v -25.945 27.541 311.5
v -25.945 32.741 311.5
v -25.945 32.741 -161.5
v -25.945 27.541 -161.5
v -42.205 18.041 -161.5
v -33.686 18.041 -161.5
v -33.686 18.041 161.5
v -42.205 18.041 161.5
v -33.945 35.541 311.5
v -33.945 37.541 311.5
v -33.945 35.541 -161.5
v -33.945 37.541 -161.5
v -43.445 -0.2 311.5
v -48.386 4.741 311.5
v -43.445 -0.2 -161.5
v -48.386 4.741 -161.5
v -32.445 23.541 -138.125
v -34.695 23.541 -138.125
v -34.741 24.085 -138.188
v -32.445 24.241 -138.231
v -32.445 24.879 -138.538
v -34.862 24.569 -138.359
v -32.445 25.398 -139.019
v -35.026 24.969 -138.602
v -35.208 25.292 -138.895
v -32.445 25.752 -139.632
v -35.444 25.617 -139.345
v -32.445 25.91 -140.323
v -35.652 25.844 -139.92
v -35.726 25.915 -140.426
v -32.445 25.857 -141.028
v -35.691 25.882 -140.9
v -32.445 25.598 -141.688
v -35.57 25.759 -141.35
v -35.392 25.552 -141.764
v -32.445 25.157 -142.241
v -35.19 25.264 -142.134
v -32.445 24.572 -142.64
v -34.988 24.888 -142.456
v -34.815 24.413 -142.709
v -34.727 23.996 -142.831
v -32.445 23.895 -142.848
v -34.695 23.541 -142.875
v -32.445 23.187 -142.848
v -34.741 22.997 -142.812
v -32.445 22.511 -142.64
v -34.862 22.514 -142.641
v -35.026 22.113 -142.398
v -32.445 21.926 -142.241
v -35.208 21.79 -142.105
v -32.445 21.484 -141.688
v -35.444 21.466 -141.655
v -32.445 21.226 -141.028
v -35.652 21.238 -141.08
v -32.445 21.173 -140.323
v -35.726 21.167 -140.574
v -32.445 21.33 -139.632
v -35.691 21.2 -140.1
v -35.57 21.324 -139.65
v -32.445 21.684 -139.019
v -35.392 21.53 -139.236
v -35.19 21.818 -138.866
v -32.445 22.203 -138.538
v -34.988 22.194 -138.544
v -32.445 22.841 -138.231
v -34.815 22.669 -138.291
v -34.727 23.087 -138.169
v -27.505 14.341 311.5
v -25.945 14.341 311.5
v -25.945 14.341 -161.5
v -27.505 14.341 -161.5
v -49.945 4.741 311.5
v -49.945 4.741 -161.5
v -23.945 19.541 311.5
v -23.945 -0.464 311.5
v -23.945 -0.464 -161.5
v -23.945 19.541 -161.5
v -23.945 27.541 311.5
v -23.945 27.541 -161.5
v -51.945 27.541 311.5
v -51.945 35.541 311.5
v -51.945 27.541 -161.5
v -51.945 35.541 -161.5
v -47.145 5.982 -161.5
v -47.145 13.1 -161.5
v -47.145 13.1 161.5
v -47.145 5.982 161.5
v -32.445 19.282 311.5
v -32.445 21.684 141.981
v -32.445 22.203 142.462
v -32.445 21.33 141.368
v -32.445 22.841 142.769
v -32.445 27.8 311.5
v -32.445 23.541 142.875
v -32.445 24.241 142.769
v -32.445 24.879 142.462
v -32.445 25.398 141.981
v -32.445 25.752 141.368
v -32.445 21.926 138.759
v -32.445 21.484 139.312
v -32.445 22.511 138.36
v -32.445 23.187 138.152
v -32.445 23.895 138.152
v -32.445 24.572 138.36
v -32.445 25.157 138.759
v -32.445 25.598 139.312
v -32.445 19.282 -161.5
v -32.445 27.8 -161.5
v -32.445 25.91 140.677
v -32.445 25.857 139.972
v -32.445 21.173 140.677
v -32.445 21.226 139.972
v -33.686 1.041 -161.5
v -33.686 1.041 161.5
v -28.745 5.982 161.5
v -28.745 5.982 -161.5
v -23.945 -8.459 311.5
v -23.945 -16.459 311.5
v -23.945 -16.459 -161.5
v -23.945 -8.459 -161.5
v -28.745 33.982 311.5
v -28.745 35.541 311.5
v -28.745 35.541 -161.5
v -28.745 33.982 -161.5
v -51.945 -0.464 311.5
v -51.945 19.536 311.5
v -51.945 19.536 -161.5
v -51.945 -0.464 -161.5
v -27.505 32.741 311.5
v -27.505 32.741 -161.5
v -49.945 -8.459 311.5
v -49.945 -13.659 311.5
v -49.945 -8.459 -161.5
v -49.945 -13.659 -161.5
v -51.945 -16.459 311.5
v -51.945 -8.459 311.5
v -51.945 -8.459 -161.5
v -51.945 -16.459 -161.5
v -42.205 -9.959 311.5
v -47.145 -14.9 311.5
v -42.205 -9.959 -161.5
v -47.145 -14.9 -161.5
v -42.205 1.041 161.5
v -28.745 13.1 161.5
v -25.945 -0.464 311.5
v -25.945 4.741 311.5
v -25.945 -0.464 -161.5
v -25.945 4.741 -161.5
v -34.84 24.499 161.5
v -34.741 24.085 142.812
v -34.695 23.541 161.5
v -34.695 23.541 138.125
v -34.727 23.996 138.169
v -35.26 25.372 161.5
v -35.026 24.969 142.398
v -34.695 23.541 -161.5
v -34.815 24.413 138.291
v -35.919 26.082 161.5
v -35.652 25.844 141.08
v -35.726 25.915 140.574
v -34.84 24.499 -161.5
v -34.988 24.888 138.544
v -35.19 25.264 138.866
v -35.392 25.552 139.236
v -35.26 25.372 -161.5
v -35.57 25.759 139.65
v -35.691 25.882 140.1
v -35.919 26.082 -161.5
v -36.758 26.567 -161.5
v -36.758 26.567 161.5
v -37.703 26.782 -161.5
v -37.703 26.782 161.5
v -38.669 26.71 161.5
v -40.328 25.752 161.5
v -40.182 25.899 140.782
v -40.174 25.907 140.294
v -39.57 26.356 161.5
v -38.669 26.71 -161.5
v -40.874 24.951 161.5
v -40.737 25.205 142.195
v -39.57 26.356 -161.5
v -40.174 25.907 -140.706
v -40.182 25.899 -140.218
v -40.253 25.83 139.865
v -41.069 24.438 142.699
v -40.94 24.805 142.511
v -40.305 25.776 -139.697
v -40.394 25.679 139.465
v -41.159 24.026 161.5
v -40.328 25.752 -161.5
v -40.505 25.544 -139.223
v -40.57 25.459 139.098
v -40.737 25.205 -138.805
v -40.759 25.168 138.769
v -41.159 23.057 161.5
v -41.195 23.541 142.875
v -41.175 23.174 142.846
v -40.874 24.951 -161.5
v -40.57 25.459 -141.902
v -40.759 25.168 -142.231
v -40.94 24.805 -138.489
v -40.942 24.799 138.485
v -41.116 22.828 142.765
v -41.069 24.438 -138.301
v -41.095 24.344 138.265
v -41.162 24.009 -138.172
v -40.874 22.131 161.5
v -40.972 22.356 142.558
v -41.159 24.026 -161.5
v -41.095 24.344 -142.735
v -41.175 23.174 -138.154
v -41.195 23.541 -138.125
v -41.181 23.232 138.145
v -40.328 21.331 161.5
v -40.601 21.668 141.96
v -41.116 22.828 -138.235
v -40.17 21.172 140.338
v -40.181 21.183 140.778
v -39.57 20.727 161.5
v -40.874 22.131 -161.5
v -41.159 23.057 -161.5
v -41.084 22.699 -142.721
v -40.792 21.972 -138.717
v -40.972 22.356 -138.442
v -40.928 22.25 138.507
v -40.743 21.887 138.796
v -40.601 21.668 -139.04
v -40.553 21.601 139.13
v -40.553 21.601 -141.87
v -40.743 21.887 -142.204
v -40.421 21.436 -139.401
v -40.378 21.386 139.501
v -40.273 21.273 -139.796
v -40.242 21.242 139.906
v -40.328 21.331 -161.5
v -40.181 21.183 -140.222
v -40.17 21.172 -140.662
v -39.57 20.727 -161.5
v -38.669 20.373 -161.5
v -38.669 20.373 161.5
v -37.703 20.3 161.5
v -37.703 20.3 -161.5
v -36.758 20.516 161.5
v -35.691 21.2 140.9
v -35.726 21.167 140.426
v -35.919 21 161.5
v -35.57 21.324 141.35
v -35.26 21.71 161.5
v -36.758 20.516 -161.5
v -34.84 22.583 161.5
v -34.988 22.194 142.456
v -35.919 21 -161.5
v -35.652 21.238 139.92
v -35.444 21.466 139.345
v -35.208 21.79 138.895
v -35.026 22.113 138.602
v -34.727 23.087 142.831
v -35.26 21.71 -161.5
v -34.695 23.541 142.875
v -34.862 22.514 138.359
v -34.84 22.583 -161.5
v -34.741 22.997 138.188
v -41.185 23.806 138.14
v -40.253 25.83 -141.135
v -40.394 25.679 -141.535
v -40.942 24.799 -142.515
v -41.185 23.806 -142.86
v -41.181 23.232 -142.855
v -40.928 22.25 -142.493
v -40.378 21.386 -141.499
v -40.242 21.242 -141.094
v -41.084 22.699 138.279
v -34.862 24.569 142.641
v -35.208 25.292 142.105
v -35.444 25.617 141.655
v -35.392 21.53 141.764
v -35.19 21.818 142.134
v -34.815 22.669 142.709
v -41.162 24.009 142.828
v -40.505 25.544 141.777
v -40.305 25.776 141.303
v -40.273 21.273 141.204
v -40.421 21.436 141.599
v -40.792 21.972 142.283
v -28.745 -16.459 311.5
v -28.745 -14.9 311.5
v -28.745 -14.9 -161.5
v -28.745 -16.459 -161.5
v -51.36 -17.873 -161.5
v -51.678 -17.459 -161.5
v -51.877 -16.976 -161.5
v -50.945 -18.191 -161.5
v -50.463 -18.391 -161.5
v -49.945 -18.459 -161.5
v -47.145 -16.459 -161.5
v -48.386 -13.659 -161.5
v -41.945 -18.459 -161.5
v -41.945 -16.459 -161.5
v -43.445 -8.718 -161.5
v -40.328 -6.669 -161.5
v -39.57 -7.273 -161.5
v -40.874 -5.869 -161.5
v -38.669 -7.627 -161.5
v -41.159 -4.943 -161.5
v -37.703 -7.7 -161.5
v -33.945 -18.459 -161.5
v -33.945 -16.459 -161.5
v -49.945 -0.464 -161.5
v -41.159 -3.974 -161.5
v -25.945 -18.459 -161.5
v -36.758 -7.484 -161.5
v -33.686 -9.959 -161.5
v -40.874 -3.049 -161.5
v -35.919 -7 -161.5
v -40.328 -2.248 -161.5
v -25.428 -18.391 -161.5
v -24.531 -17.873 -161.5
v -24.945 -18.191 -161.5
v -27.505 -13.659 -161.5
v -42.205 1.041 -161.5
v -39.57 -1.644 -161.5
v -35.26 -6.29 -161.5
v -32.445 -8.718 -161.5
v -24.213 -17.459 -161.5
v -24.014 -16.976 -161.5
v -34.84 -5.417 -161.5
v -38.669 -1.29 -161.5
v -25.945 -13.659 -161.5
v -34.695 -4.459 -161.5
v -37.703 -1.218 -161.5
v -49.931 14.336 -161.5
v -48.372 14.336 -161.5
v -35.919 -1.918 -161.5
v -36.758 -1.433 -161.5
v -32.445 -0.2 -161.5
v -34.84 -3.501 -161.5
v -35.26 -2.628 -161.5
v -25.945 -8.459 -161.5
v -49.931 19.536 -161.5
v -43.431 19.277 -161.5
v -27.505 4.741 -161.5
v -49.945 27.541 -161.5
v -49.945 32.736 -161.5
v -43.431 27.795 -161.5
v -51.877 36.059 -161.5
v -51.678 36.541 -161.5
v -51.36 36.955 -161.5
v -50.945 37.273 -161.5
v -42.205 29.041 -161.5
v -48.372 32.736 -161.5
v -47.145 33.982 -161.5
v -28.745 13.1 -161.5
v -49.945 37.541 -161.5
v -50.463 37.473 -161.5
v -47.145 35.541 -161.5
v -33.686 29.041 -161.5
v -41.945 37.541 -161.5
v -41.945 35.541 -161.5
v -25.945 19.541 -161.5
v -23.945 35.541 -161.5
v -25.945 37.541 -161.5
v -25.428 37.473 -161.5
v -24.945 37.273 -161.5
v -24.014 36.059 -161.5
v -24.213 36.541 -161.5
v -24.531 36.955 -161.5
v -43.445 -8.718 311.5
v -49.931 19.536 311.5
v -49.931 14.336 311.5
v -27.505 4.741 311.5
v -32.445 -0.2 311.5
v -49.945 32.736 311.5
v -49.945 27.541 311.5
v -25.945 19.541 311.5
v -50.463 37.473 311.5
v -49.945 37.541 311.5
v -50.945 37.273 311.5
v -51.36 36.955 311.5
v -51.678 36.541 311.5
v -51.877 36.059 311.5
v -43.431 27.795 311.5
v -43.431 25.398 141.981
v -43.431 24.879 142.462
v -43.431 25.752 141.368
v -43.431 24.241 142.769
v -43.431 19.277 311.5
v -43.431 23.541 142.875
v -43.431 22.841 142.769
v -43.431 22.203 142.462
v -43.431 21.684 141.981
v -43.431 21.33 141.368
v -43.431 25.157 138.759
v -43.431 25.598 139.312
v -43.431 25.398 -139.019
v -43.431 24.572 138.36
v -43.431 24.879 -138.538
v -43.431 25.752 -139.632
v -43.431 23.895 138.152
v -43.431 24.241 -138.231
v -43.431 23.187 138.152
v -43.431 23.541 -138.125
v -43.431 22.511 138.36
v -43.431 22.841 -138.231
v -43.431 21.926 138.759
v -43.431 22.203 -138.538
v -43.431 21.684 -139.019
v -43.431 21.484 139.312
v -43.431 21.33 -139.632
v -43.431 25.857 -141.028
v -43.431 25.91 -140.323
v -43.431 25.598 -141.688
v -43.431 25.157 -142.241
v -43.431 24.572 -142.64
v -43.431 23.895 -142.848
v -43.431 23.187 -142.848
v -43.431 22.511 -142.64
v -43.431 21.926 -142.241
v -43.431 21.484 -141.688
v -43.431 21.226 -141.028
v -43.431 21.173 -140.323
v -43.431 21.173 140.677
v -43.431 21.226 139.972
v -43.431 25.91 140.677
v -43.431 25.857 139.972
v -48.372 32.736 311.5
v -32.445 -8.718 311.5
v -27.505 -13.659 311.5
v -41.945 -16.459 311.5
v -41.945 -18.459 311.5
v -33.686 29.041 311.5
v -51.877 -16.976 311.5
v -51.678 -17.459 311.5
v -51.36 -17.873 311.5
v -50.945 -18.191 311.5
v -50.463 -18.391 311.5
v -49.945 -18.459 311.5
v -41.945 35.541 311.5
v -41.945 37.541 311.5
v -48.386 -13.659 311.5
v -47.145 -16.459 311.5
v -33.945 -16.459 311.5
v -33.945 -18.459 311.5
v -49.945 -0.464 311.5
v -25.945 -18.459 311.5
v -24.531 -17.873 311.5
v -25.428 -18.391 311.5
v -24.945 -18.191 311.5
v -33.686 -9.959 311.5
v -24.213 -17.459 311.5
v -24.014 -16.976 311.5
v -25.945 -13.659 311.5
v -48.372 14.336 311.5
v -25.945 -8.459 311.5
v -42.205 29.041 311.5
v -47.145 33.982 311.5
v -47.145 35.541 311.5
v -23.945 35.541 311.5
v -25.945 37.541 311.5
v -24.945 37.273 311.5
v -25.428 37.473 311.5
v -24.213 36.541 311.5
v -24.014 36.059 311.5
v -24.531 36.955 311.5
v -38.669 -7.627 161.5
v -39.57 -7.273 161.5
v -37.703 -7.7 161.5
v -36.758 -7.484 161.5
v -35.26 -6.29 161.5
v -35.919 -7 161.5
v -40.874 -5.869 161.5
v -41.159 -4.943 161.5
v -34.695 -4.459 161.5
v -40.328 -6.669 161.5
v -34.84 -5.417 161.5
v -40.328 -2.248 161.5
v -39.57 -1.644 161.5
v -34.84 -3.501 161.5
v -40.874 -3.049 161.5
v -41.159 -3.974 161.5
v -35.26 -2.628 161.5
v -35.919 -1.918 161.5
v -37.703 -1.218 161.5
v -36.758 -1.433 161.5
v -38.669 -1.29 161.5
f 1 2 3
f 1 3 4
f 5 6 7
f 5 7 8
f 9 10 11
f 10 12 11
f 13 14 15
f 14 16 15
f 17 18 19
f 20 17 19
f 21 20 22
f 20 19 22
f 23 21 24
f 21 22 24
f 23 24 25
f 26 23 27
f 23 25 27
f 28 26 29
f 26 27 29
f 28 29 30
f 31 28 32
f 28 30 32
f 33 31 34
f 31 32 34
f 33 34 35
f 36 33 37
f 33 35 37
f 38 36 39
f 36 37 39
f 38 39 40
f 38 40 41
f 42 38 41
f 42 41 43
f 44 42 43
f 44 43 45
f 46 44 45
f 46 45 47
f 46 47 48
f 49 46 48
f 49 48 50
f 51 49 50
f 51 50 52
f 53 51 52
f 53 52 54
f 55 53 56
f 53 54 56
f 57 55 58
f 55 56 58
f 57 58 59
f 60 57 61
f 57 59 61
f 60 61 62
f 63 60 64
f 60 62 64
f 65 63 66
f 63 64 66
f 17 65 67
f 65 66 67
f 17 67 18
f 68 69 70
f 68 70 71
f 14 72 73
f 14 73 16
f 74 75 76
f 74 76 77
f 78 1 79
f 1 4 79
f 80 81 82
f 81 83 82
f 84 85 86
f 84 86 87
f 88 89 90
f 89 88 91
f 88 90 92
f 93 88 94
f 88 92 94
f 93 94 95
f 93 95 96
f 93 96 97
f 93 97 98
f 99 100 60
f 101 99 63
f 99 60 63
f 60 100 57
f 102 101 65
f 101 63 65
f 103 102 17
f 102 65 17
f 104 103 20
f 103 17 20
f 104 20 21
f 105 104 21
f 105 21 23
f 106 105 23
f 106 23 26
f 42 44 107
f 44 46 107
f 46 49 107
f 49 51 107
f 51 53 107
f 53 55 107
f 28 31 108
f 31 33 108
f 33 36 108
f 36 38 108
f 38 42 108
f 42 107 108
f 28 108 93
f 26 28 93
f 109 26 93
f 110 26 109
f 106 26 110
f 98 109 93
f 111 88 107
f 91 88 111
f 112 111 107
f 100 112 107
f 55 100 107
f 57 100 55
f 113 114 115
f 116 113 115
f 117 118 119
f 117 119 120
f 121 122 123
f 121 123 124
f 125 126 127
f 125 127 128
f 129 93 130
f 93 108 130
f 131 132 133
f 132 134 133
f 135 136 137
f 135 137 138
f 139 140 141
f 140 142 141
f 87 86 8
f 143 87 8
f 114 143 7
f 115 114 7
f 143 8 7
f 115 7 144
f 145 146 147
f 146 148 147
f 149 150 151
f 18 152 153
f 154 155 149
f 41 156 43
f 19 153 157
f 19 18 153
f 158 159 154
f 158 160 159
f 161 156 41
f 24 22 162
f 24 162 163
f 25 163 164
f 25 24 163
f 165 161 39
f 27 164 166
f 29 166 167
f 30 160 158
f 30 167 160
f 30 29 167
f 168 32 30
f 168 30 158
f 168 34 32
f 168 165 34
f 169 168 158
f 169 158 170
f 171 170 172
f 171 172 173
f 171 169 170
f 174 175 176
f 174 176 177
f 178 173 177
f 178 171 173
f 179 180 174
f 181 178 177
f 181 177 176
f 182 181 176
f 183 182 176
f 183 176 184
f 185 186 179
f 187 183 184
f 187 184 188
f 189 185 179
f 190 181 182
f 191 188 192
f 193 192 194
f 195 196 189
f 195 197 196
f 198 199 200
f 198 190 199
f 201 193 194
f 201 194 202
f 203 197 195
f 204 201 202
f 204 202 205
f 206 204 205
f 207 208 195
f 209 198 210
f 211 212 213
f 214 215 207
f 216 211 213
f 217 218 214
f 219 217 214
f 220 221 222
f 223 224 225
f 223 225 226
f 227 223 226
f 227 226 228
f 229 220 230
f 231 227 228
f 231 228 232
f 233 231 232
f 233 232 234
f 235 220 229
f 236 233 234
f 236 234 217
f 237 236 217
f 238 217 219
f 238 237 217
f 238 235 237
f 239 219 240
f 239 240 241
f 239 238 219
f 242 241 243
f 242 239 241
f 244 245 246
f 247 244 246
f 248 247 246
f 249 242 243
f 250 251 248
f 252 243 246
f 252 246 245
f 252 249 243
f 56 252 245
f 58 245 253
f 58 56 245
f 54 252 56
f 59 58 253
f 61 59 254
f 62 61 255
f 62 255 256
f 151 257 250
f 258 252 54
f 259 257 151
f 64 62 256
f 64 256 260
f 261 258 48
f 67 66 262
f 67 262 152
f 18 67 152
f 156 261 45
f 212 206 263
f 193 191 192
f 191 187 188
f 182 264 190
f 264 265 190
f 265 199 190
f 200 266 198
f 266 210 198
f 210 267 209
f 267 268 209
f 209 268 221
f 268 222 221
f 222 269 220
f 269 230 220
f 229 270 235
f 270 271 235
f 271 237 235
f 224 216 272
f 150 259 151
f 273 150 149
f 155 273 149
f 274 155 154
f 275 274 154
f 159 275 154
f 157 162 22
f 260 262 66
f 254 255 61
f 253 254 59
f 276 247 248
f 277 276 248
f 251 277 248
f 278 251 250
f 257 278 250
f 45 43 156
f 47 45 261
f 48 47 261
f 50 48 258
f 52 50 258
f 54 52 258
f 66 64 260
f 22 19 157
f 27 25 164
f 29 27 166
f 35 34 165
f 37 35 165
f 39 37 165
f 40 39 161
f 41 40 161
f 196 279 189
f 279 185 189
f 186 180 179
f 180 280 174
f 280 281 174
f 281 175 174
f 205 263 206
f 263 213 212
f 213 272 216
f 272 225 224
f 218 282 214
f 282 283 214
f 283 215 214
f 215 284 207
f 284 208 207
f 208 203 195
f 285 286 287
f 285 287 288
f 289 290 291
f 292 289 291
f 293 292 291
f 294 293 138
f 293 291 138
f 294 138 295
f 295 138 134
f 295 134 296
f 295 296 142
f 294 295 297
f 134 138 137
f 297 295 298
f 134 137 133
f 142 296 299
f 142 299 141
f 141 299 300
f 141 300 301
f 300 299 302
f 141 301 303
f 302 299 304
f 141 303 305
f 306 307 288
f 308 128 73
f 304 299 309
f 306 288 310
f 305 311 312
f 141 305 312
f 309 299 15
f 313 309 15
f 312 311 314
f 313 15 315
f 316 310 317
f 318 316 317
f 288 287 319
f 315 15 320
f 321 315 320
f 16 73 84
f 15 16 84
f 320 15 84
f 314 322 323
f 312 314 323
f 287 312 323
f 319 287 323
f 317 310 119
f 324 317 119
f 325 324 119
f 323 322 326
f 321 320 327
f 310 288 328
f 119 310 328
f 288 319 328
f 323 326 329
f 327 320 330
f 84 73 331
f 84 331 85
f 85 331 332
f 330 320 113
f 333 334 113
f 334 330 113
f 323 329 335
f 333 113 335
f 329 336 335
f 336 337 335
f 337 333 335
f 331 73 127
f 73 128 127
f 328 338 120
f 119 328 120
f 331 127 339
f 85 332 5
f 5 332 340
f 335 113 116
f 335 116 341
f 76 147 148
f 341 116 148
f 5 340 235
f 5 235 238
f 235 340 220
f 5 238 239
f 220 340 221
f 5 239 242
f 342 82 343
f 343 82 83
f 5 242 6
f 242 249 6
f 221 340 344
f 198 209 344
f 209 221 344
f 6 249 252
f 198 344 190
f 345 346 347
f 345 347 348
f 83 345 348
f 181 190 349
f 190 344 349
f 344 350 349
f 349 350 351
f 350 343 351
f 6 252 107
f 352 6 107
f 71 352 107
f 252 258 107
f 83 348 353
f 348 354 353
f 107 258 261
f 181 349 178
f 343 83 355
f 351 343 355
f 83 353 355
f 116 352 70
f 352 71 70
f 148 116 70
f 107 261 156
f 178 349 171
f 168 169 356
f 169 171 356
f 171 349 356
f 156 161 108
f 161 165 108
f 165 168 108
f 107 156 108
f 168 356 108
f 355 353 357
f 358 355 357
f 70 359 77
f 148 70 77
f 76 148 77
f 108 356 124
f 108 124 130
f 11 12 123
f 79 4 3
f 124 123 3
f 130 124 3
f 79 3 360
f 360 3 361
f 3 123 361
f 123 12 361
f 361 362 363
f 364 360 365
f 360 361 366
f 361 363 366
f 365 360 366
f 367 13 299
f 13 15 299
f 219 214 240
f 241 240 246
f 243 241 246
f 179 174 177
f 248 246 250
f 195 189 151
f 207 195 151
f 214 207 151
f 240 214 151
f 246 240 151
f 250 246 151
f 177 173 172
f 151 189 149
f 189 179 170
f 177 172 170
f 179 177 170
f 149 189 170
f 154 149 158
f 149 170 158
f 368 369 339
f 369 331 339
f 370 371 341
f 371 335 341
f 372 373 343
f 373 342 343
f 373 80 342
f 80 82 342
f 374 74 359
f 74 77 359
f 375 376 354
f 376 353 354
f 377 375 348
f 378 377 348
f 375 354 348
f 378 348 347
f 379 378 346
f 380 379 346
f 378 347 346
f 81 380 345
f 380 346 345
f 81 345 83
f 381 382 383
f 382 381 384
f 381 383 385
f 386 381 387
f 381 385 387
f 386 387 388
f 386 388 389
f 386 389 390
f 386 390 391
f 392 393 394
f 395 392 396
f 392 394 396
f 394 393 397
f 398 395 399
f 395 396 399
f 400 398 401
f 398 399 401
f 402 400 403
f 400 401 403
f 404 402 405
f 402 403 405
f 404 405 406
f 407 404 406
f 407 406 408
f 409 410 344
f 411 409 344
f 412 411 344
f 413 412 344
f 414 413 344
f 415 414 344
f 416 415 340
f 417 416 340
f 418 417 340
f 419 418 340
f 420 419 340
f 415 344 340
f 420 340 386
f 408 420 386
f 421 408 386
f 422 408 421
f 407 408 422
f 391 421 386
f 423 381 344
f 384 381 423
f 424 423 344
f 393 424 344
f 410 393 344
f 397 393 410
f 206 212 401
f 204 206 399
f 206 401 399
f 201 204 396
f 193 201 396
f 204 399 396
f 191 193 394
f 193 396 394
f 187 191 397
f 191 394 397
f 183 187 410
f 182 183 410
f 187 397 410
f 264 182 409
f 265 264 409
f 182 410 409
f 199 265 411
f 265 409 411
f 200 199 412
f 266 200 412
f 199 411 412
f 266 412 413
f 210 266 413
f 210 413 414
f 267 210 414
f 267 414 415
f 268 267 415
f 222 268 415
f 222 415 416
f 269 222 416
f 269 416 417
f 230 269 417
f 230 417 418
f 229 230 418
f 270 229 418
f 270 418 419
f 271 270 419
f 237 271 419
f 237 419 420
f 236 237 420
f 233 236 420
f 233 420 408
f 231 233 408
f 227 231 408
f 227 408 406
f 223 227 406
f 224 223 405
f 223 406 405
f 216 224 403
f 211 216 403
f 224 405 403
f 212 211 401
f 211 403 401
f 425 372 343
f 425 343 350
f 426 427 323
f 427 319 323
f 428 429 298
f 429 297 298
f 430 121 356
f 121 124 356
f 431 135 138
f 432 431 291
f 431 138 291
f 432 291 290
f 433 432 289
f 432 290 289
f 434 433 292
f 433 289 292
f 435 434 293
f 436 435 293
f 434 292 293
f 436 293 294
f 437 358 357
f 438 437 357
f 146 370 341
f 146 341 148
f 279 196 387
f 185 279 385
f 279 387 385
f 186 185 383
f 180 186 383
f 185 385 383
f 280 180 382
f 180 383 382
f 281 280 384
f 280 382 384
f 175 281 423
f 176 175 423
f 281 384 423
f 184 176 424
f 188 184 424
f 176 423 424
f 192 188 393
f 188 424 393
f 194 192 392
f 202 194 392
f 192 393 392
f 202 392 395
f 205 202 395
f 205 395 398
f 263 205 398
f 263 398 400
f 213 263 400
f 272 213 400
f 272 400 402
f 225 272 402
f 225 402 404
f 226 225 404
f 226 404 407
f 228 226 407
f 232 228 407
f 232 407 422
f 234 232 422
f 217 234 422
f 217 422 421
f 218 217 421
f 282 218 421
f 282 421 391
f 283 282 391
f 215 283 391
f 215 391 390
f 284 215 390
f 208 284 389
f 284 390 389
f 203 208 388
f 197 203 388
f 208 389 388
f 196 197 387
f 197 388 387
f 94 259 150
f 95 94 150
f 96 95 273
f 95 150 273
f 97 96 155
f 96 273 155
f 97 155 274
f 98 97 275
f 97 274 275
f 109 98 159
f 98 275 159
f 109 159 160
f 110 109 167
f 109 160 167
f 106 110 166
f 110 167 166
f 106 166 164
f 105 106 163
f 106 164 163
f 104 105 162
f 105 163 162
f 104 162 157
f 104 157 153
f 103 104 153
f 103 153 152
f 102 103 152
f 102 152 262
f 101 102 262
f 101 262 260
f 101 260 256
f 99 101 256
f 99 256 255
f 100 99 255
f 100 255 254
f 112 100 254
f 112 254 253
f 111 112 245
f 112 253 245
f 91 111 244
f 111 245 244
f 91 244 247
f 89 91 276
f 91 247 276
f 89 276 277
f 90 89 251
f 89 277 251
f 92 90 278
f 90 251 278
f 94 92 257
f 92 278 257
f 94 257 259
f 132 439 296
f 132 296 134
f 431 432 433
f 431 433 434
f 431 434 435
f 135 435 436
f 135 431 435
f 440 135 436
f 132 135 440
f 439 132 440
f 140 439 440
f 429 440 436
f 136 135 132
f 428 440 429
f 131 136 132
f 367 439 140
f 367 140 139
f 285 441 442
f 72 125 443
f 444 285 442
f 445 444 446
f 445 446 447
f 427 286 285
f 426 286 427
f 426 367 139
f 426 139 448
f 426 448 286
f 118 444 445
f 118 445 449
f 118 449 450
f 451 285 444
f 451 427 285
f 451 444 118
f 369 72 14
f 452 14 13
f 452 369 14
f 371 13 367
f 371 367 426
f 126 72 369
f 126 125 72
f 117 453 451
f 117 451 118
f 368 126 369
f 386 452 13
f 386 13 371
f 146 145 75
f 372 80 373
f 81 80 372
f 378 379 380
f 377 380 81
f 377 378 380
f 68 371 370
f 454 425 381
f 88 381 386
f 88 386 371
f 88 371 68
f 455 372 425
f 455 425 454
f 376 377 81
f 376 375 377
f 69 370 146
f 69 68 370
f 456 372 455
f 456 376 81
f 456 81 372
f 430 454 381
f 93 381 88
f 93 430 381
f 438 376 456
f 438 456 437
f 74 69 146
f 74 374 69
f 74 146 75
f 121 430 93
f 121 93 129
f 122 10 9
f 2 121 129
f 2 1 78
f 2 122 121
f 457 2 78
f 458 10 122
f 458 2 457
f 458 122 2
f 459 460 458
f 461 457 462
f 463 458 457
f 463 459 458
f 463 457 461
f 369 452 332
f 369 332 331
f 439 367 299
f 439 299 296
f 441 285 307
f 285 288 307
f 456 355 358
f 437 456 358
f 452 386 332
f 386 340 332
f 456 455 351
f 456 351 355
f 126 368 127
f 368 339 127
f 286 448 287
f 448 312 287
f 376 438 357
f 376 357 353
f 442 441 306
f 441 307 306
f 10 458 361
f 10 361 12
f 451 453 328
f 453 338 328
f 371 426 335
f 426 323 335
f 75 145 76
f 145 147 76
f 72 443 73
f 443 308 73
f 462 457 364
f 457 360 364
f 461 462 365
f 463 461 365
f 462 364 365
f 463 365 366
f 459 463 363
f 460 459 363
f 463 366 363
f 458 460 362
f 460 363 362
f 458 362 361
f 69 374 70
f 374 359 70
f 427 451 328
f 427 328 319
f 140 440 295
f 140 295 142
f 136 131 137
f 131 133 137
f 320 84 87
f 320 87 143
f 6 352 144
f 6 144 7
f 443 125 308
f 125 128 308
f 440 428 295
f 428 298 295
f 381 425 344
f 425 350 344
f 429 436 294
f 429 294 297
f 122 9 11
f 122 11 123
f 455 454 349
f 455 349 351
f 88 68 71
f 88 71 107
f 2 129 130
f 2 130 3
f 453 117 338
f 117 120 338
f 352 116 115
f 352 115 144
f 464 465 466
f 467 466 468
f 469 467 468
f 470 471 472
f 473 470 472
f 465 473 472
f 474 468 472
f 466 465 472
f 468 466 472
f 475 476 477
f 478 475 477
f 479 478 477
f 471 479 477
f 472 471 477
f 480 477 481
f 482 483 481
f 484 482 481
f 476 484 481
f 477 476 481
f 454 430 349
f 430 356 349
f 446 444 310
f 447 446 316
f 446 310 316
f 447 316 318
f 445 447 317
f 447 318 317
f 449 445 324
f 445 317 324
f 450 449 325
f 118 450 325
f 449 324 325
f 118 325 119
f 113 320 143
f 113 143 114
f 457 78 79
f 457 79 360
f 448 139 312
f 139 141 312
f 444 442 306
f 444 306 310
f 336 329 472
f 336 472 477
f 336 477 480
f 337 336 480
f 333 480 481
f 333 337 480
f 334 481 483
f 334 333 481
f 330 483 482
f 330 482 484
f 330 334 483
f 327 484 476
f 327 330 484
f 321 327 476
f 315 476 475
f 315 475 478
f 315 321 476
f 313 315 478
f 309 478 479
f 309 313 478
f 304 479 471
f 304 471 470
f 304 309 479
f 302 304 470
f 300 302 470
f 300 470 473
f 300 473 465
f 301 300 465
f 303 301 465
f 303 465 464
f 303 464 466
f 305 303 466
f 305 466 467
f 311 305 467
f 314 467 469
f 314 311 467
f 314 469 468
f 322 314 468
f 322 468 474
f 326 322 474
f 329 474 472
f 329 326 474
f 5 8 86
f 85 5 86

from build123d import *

# Parameters (mm, degrees)
EXTRUSION2_DEPTH           = 161.5
EXTRUSION2_DEPTH_BACK      = 161.5
SKETCH1_R                  = 3.25
F_4_7_4_7_DIAMETER_HOLE1_D = 4.75
BOSS_EXTRUDE1_DEPTH        = 150


with BuildPart() as part:
    # Sketch1 → Extrusion2 (new, two sides: drawn at the far end of the back side and taken through both)
    with BuildSketch(Plane.XY.offset(-EXTRUSION2_DEPTH_BACK)):
        with BuildLine():
            Line((-51.945456549, 19.536039976), (-51.945456549, -0.463960024))
            Line((-51.945456549, -0.463960024), (-49.945456549, -0.463960024))
            Line((-49.945456549, -0.463960024), (-49.945456549, 4.741263919))
            Line((-49.945456549, 4.741263919), (-48.386244669, 4.741263919))
            Line((-48.386244669, 4.741263919), (-43.445456549, -0.1995242))
            Line((-43.445456549, -0.1995242), (-43.445456549, -8.717947961))
            Line((-43.445456549, -8.717947961), (-48.386244669, -13.658736081))
            Line((-48.386244669, -13.658736081), (-49.945456549, -13.658736081))
            Line((-49.945456549, -13.658736081), (-49.945456549, -8.458736081))
            Line((-49.945456549, -8.458736081), (-51.945456549, -8.458736081))
            Line((-51.945456549, -8.458736081), (-51.945456549, -16.458736081))
            ThreePointArc((-51.945456549, -16.458736081), (-51.359670111, -17.872949643), (-49.945456549, -18.458736081))
            Line((-49.945456549, -18.458736081), (-41.945456549, -18.458736081))
            Line((-41.945456549, -18.458736081), (-41.945456549, -16.458736081))
            Line((-41.945456549, -16.458736081), (-47.145456549, -16.458736081))
            Line((-47.145456549, -16.458736081), (-47.145456549, -14.8995242))
            Line((-47.145456549, -14.8995242), (-42.204668429, -9.958736081))
            Line((-42.204668429, -9.958736081), (-33.686244669, -9.958736081))
            Line((-33.686244669, -9.958736081), (-28.745456549, -14.8995242))
            Line((-28.745456549, -14.8995242), (-28.745456549, -16.458736081))
            Line((-28.745456549, -16.458736081), (-33.945456549, -16.458736081))
            Line((-33.945456549, -16.458736081), (-33.945456549, -18.458736081))
            Line((-33.945456549, -18.458736081), (-25.945456549, -18.458736081))
            ThreePointArc((-25.945456549, -18.458736081), (-24.531242987, -17.872949643), (-23.945456549, -16.458736081))
            Line((-23.945456549, -16.458736081), (-23.945456549, -8.458736081))
            Line((-23.945456549, -8.458736081), (-25.945456549, -8.458736081))
            Line((-25.945456549, -8.458736081), (-25.945456549, -13.658736081))
            Line((-25.945456549, -13.658736081), (-27.504668429, -13.658736081))
            Line((-27.504668429, -13.658736081), (-32.445456549, -8.717947961))
            Line((-32.445456549, -8.717947961), (-32.445456549, -0.1995242))
            Line((-32.445456549, -0.1995242), (-27.504668429, 4.741263919))
            Line((-27.504668429, 4.741263919), (-25.945456549, 4.741263919))
            Line((-25.945456549, 4.741263919), (-25.945456549, -0.463960024))
            Line((-25.945456549, -0.463960024), (-23.945456549, -0.463960024))
            Line((-23.945456549, -0.463960024), (-23.945456549, 19.541263919))
            Line((-23.945456549, 19.541263919), (-25.945456549, 19.541263919))
            Line((-25.945456549, 19.541263919), (-25.945456549, 14.341263919))
            Line((-25.945456549, 14.341263919), (-27.504668429, 14.341263919))
            Line((-27.504668429, 14.341263919), (-32.445456549, 19.282052039))
            Line((-32.445456549, 19.282052039), (-32.445456549, 27.8004758))
            Line((-32.445456549, 27.8004758), (-27.504668429, 32.741263919))
            Line((-27.504668429, 32.741263919), (-25.945456549, 32.741263919))
            Line((-25.945456549, 32.741263919), (-25.945456549, 27.541263919))
            Line((-25.945456549, 27.541263919), (-23.945456549, 27.541263919))
            Line((-23.945456549, 27.541263919), (-23.945456549, 35.541263919))
            ThreePointArc((-23.945456549, 35.541263919), (-24.531242987, 36.955477482), (-25.945456549, 37.541263919))
            Line((-25.945456549, 37.541263919), (-33.945456549, 37.541263919))
            Line((-33.945456549, 37.541263919), (-33.945456549, 35.541263919))
            Line((-33.945456549, 35.541263919), (-28.745456549, 35.541263919))
            Line((-28.745456549, 35.541263919), (-28.745456549, 33.982052039))
            Line((-28.745456549, 33.982052039), (-33.686244669, 29.041263919))
            Line((-33.686244669, 29.041263919), (-42.204668429, 29.041263919))
            Line((-42.204668429, 29.041263919), (-47.145456549, 33.982052039))
            Line((-47.145456549, 33.982052039), (-47.145456549, 35.541263919))
            Line((-47.145456549, 35.541263919), (-41.945456549, 35.541263919))
            Line((-41.945456549, 35.541263919), (-41.945456549, 37.541263919))
            Line((-41.945456549, 37.541263919), (-49.945456549, 37.541263919))
            ThreePointArc((-49.945456549, 37.541263919), (-51.359670111, 36.955477482), (-51.945456549, 35.541263919))
            Line((-51.945456549, 35.541263919), (-51.945456549, 27.541263919))
            Line((-51.945456549, 27.541263919), (-49.945456549, 27.541263919))
            Line((-49.945456549, 27.541263919), (-49.945456549, 32.736039976))
            Line((-49.945456549, 32.736039976), (-48.372120999, 32.736039976))
            Line((-48.372120999, 32.736039976), (-43.43133288, 27.795251856))
            Line((-43.43133288, 27.795251856), (-43.43133288, 19.276828096))
            Line((-43.43133288, 19.276828096), (-48.372120999, 14.336039976))
            Line((-48.372120999, 14.336039976), (-49.93133288, 14.336039976))
            Line((-49.93133288, 14.336039976), (-49.93133288, 19.536039976))
            Line((-49.93133288, 19.536039976), (-51.945456549, 19.536039976))
        make_face()
        with Locations((-37.945456549, -4.458736081)):
            Circle(SKETCH1_R, mode=Mode.SUBTRACT)
        with Locations((-37.945456549, 23.541263919)):
            Circle(SKETCH1_R, mode=Mode.SUBTRACT)
        Polygon((-33.686244669, 18.041263919), (-42.204668429, 18.041263919), (-47.145456549, 13.1004758), (-47.145456549, 5.982052039), (-42.204668429, 1.041263919), (-33.686244669, 1.041263919), (-28.745456549, 5.982052039), (-28.745456549, 13.1004758), align=None, mode=Mode.SUBTRACT)
    extrude(amount=EXTRUSION2_DEPTH + EXTRUSION2_DEPTH_BACK)

    # Ø4.7 (4.7) Diameter Hole1 (through all)
    with Locations(Plane(origin=(-23.945456549, 0, 0), x_dir=(0, 0, -1), z_dir=(1, 0, 0))):
        with Locations((-140.5, 23.541263919), (140.5, 23.541263919)):
            Hole(F_4_7_4_7_DIAMETER_HOLE1_D / 2)

    # Sketch5 → Boss-Extrude1 (add)
    with BuildSketch(Plane.XY.offset(161.5)):
        with BuildLine():
            Line((-41.945456549, 37.541263919), (-49.945456549, 37.541263919))
            ThreePointArc((-49.945456549, 37.541263919), (-51.359670111, 36.955477482), (-51.945456549, 35.541263919))
            Line((-51.945456549, 35.541263919), (-51.945456549, 27.541263919))
            Line((-51.945456549, 27.541263919), (-49.945456549, 27.541263919))
            Line((-49.945456549, 27.541263919), (-49.945456549, 32.736039976))
            Line((-49.945456549, 32.736039976), (-48.372120999, 32.736039976))
            Line((-48.372120999, 32.736039976), (-43.43133288, 27.795251856))
            Line((-43.43133288, 27.795251856), (-43.43133288, 19.276828096))
            Line((-43.43133288, 19.276828096), (-48.372120999, 14.336039976))
            Line((-48.372120999, 14.336039976), (-49.93133288, 14.336039976))
            Line((-49.93133288, 14.336039976), (-49.93133288, 19.536039976))
            Line((-49.93133288, 19.536039976), (-51.945456549, 19.536039976))
            Line((-51.945456549, 19.536039976), (-51.945456549, -0.463960024))
            Line((-51.945456549, -0.463960024), (-49.945456549, -0.463960024))
            Line((-49.945456549, -0.463960024), (-49.945456549, 4.741263919))
            Line((-49.945456549, 4.741263919), (-48.386244669, 4.741263919))
            Line((-48.386244669, 4.741263919), (-43.445456549, -0.1995242))
            Line((-43.445456549, -0.1995242), (-43.445456549, -8.717947961))
            Line((-43.445456549, -8.717947961), (-48.386244669, -13.658736081))
            Line((-48.386244669, -13.658736081), (-49.945456549, -13.658736081))
            Line((-49.945456549, -13.658736081), (-49.945456549, -8.458736081))
            Line((-49.945456549, -8.458736081), (-51.945456549, -8.458736081))
            Line((-51.945456549, -8.458736081), (-51.945456549, -16.458736081))
            ThreePointArc((-51.945456549, -16.458736081), (-51.359670111, -17.872949643), (-49.945456549, -18.458736081))
            Line((-49.945456549, -18.458736081), (-41.945456549, -18.458736081))
            Line((-41.945456549, -18.458736081), (-41.945456549, -16.458736081))
            Line((-41.945456549, -16.458736081), (-47.145456549, -16.458736081))
            Line((-47.145456549, -16.458736081), (-47.145456549, -14.8995242))
            Line((-47.145456549, -14.8995242), (-42.204668429, -9.958736081))
            Line((-42.204668429, -9.958736081), (-33.686244669, -9.958736081))
            Line((-33.686244669, -9.958736081), (-28.745456549, -14.8995242))
            Line((-28.745456549, -14.8995242), (-28.745456549, -16.458736081))
            Line((-28.745456549, -16.458736081), (-33.945456549, -16.458736081))
            Line((-33.945456549, -16.458736081), (-33.945456549, -18.458736081))
            Line((-33.945456549, -18.458736081), (-25.945456549, -18.458736081))
            ThreePointArc((-25.945456549, -18.458736081), (-24.531242987, -17.872949643), (-23.945456549, -16.458736081))
            Line((-23.945456549, -16.458736081), (-23.945456549, -8.458736081))
            Line((-23.945456549, -8.458736081), (-25.945456549, -8.458736081))
            Line((-25.945456549, -8.458736081), (-25.945456549, -13.658736081))
            Line((-25.945456549, -13.658736081), (-27.504668429, -13.658736081))
            Line((-27.504668429, -13.658736081), (-32.445456549, -8.717947961))
            Line((-32.445456549, -8.717947961), (-32.445456549, -0.1995242))
            Line((-32.445456549, -0.1995242), (-27.504668429, 4.741263919))
            Line((-27.504668429, 4.741263919), (-25.945456549, 4.741263919))
            Line((-25.945456549, 4.741263919), (-25.945456549, -0.463960024))
            Line((-25.945456549, -0.463960024), (-23.945456549, -0.463960024))
            Line((-23.945456549, -0.463960024), (-23.945456549, 19.541263919))
            Line((-23.945456549, 19.541263919), (-25.945456549, 19.541263919))
            Line((-25.945456549, 19.541263919), (-25.945456549, 14.341263919))
            Line((-25.945456549, 14.341263919), (-27.504668429, 14.341263919))
            Line((-27.504668429, 14.341263919), (-32.445456549, 19.282052039))
            Line((-32.445456549, 19.282052039), (-32.445456549, 27.8004758))
            Line((-32.445456549, 27.8004758), (-27.504668429, 32.741263919))
            Line((-27.504668429, 32.741263919), (-25.945456549, 32.741263919))
            Line((-25.945456549, 32.741263919), (-25.945456549, 27.541263919))
            Line((-25.945456549, 27.541263919), (-23.945456549, 27.541263919))
            Line((-23.945456549, 27.541263919), (-23.945456549, 35.541263919))
            ThreePointArc((-23.945456549, 35.541263919), (-24.531242987, 36.955477482), (-25.945456549, 37.541263919))
            Line((-25.945456549, 37.541263919), (-33.945456549, 37.541263919))
            Line((-33.945456549, 37.541263919), (-33.945456549, 35.541263919))
            Line((-33.945456549, 35.541263919), (-28.745456549, 35.541263919))
            Line((-28.745456549, 35.541263919), (-28.745456549, 33.982052039))
            Line((-28.745456549, 33.982052039), (-33.686244669, 29.041263919))
            Line((-33.686244669, 29.041263919), (-42.204668429, 29.041263919))
            Line((-42.204668429, 29.041263919), (-47.145456549, 33.982052039))
            Line((-47.145456549, 33.982052039), (-47.145456549, 35.541263919))
            Line((-47.145456549, 35.541263919), (-41.945456549, 35.541263919))
            Line((-41.945456549, 35.541263919), (-41.945456549, 37.541263919))
        make_face()
    extrude(amount=BOSS_EXTRUDE1_DEPTH)


solid = part.part
